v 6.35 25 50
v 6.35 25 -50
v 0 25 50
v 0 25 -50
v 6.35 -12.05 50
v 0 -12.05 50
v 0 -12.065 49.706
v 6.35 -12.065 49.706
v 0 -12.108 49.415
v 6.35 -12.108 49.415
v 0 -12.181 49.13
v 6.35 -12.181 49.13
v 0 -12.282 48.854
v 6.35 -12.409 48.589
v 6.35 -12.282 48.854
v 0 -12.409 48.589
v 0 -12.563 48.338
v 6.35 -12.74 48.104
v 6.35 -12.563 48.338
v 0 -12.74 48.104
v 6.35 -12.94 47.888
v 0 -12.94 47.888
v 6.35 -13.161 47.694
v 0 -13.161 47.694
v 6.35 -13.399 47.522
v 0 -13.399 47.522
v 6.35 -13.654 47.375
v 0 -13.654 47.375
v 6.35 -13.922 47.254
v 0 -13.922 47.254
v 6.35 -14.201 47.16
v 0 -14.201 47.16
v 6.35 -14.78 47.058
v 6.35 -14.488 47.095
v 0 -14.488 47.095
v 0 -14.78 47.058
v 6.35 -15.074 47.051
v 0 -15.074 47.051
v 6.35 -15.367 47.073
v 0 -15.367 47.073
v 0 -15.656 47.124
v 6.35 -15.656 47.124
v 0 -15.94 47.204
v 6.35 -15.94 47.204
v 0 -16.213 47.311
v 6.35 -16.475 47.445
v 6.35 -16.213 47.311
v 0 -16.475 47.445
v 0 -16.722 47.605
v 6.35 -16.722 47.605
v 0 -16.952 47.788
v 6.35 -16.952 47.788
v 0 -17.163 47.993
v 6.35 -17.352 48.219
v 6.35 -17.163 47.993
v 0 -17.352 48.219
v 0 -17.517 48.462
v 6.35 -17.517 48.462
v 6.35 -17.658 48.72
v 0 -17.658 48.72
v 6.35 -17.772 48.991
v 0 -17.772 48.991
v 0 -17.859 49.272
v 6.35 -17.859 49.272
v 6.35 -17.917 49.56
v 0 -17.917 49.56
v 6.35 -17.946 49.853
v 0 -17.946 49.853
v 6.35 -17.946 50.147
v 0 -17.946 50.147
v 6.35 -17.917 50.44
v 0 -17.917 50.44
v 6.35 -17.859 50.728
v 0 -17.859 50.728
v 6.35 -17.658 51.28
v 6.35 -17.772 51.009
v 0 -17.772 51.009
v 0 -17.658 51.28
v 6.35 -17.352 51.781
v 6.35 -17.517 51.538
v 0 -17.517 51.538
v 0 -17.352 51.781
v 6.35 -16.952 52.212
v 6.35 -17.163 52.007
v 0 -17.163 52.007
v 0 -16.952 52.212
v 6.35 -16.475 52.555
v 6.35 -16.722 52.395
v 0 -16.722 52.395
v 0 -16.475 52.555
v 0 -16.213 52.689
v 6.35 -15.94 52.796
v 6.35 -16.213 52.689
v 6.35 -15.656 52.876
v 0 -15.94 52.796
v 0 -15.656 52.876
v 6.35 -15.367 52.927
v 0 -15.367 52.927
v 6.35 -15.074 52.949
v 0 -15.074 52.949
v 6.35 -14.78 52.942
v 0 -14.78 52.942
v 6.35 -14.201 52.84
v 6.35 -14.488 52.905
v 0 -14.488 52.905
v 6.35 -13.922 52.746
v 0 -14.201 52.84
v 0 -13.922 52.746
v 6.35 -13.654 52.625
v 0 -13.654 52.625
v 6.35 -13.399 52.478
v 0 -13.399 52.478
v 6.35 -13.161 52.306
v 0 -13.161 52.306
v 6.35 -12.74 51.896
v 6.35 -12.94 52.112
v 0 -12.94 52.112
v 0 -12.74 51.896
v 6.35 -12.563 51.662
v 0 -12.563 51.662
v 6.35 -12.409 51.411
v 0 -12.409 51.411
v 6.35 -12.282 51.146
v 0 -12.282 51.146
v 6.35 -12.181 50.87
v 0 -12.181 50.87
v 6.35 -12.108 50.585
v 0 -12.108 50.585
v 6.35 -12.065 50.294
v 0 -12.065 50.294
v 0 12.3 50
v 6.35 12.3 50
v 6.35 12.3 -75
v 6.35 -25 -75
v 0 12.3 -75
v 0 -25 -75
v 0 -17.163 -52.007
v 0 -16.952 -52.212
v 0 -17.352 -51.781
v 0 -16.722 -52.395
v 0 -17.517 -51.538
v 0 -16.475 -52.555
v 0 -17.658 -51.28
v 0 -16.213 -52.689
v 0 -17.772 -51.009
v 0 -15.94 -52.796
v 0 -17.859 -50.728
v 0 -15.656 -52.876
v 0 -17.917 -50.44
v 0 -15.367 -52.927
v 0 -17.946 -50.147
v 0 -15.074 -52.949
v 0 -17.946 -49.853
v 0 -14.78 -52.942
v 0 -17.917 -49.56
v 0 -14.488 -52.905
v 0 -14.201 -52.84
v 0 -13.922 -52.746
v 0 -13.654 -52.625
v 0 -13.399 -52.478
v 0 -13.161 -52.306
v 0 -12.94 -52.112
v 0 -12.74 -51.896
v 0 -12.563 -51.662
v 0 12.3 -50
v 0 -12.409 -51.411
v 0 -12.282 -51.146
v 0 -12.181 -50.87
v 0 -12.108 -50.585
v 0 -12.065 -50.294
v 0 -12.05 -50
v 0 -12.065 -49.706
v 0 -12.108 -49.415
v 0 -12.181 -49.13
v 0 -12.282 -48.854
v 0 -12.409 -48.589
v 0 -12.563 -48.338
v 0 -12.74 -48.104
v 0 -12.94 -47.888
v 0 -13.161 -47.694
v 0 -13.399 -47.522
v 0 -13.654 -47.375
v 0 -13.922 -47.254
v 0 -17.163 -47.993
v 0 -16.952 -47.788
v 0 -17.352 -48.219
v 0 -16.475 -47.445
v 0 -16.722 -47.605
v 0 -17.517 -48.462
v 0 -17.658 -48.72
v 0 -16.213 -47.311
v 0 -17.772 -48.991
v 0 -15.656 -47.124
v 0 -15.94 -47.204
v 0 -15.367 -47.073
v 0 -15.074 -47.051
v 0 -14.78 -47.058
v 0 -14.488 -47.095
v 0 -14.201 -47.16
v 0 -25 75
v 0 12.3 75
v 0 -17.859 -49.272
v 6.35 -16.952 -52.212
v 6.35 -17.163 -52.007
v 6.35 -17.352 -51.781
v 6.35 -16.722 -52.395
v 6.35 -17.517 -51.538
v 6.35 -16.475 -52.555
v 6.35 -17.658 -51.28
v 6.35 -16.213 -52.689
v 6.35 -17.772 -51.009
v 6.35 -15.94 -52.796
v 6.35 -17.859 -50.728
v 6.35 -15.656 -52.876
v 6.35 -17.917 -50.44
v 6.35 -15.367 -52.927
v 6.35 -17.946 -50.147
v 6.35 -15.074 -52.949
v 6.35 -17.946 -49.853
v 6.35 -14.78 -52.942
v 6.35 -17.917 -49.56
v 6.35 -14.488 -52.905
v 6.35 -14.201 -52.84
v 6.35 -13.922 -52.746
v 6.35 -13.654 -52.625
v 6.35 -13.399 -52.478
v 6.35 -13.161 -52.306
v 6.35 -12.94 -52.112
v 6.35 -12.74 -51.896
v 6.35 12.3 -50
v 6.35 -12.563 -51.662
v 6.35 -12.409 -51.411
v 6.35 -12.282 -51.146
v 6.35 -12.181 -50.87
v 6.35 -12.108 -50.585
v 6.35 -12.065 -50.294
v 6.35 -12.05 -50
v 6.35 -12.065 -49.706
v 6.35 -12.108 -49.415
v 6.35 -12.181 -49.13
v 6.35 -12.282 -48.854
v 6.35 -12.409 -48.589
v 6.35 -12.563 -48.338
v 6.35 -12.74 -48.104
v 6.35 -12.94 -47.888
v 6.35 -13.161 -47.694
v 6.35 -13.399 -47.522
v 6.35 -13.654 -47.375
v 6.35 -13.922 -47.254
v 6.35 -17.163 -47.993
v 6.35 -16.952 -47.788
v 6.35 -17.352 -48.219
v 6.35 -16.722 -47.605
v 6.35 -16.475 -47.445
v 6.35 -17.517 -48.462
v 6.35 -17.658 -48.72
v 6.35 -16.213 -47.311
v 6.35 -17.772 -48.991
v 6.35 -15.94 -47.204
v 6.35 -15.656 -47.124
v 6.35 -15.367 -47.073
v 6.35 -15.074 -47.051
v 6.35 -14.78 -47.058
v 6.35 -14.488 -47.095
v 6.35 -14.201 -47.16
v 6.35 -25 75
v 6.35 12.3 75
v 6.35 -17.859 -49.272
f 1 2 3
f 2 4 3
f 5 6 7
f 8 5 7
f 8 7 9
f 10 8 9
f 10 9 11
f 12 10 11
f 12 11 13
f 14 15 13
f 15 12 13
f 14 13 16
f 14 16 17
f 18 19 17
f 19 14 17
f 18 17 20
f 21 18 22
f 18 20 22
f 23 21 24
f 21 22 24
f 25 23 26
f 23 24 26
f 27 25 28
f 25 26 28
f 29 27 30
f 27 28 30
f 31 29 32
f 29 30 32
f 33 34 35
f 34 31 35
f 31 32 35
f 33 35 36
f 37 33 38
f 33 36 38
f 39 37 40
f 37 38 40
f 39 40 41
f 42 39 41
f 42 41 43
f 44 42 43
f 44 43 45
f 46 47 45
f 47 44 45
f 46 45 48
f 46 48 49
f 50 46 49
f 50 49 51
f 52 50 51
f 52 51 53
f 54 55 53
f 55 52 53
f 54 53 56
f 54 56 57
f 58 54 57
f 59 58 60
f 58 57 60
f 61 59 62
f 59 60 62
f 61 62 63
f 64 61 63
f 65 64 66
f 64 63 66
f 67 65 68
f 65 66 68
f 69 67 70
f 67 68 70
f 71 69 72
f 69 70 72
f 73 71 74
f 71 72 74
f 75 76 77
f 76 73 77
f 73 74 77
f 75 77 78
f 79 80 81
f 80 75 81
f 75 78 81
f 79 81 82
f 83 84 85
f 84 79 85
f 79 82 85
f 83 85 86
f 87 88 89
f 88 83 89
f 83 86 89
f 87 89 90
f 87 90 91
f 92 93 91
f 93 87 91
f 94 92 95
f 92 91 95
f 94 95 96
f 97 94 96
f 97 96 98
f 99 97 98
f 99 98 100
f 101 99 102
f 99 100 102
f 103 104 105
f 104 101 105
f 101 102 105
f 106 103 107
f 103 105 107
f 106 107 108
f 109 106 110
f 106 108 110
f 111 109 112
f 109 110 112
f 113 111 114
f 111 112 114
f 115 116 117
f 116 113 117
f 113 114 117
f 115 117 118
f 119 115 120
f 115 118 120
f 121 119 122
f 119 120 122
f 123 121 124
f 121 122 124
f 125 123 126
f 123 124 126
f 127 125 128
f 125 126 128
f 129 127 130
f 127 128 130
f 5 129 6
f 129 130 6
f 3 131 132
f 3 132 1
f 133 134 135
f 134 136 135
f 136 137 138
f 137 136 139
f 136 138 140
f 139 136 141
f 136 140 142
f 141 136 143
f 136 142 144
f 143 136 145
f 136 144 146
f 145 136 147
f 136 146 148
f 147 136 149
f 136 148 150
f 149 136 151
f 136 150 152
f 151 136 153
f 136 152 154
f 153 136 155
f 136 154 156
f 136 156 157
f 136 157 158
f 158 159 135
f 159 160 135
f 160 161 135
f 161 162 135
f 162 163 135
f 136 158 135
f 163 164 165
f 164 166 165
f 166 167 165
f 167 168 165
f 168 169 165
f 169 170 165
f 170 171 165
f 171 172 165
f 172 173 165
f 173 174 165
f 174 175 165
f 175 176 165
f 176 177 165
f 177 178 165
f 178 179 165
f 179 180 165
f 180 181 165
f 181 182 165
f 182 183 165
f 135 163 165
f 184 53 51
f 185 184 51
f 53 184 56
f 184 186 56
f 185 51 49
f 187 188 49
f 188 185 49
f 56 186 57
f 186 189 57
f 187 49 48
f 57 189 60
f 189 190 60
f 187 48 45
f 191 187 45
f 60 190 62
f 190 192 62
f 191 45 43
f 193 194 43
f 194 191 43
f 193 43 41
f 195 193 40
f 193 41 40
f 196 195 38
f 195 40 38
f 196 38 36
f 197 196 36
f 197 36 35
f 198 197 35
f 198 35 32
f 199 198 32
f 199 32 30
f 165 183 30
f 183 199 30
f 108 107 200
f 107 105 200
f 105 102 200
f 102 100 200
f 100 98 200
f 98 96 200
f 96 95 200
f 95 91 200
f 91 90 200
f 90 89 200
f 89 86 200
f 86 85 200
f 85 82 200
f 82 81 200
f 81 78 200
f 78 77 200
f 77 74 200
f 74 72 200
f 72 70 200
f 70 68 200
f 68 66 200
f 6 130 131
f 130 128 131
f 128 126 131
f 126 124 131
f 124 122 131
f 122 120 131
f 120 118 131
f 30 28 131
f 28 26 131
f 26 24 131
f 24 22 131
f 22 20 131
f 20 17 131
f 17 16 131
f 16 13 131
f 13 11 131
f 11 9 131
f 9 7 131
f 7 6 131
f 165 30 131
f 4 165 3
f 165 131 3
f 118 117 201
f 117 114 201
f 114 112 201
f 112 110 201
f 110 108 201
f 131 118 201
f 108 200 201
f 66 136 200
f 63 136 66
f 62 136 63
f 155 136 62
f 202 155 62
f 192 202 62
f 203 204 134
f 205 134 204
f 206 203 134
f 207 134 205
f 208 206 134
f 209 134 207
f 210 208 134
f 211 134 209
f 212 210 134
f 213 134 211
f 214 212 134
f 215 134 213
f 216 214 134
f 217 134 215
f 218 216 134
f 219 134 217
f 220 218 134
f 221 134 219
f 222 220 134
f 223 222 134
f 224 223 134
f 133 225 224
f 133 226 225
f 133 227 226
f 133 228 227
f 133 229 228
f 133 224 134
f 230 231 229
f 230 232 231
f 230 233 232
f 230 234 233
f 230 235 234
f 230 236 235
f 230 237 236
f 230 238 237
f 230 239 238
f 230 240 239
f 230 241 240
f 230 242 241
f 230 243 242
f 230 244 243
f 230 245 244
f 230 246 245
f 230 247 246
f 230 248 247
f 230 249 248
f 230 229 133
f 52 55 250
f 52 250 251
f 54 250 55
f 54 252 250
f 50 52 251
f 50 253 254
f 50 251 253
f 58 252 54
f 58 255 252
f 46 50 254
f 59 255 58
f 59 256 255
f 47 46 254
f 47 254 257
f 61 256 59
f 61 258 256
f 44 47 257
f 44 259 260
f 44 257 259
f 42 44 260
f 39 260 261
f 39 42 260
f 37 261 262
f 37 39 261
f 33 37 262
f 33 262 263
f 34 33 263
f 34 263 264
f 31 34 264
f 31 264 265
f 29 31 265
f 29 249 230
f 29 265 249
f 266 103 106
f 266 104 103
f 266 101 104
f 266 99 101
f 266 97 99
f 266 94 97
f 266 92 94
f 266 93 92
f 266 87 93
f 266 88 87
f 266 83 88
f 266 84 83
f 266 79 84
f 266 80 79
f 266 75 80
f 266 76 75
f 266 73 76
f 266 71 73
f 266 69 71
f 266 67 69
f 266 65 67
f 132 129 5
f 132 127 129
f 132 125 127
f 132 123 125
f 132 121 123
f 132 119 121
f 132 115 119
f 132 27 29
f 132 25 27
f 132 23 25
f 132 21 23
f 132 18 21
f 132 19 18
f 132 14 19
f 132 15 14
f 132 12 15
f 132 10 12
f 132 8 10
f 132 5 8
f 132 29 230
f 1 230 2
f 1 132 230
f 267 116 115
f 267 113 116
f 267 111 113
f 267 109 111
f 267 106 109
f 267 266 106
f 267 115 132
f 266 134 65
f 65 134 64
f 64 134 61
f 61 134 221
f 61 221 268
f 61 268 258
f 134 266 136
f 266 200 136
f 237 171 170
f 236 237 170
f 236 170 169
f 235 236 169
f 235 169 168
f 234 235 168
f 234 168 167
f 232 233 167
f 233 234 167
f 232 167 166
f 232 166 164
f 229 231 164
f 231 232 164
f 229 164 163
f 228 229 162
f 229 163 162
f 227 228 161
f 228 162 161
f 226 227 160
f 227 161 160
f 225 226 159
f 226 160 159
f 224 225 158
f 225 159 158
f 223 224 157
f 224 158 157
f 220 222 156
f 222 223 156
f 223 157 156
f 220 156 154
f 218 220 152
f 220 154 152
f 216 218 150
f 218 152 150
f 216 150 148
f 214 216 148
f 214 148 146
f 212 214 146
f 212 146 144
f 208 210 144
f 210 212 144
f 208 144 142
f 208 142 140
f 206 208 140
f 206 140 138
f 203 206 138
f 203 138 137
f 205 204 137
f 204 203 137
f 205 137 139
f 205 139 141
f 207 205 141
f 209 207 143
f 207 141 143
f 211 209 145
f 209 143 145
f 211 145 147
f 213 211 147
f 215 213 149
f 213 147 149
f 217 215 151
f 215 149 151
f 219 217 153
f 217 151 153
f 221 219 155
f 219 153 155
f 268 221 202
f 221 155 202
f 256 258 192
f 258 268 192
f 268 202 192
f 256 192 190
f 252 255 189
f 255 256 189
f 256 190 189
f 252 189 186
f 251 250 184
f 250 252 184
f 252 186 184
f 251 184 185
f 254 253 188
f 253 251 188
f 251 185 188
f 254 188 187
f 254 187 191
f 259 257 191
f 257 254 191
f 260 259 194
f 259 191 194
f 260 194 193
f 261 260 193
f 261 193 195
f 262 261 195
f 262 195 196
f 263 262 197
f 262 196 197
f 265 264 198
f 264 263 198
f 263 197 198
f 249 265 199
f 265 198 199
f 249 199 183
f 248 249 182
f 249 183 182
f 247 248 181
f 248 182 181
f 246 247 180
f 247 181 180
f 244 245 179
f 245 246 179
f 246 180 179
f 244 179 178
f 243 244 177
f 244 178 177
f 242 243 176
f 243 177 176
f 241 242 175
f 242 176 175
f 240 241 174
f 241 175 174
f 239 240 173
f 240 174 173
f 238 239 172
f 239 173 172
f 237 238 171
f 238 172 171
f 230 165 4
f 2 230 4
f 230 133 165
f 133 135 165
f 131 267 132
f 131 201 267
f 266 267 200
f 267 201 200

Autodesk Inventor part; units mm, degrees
ref_plane "YZ Plane" through (0, 0, 0) normal (1, 0, 0) x (0, 1, 0)
ref_plane "XZ Plane" through (0, 0, 0) normal (0, 1, 0) x (-1, 0, 0)
ref_plane "XY Plane" through (0, 0, 0) normal (0, 0, 1) x (1, 0, 0)
sketch "Sketch1" plane through (0, 0, 0) normal (1, 0, 0) x (0, 1, 0)
  line L0 (-25, 75) -> (-25, -75)
  line L1 (-25, -75) -> (12.3, -75)
  line L2 (25, -50) -> (25, 50)
  line L3 (12.3, 75) -> (-25, 75)
  line L4 (12.3, 75) -> (12.3, 50)
  line L5 (12.3, 50) -> (25, 50)
  line L6 (12.3, -75) -> (12.3, -50)
  line L7 (12.3, -50) -> (25, -50)
  circle A0 centre (-15, 50) radius 2.95
  circle A1 centre (-15, -50) radius 2.95
  point P0 (0, 0)
  point P1 (25, 0)
  point P2 (0, 75)
  point P3 (18.65, 50)
  point P4 (18.65, -50)
  point P5 (25, 0)
  dimension "d0" = 150
  dimension "d2" = 12.7
  dimension "d3" = 25
  dimension "d4" = 12.7
  dimension "d5" = 25
  dimension "d6" = 50
  dimension "d7" = 5.9
  dimension "d8" = 5.9
  dimension "d9" = 10
extrude "Extrusion1" add sketch "Sketch1" along normal blind 6.35
properties part number "SideV1"
